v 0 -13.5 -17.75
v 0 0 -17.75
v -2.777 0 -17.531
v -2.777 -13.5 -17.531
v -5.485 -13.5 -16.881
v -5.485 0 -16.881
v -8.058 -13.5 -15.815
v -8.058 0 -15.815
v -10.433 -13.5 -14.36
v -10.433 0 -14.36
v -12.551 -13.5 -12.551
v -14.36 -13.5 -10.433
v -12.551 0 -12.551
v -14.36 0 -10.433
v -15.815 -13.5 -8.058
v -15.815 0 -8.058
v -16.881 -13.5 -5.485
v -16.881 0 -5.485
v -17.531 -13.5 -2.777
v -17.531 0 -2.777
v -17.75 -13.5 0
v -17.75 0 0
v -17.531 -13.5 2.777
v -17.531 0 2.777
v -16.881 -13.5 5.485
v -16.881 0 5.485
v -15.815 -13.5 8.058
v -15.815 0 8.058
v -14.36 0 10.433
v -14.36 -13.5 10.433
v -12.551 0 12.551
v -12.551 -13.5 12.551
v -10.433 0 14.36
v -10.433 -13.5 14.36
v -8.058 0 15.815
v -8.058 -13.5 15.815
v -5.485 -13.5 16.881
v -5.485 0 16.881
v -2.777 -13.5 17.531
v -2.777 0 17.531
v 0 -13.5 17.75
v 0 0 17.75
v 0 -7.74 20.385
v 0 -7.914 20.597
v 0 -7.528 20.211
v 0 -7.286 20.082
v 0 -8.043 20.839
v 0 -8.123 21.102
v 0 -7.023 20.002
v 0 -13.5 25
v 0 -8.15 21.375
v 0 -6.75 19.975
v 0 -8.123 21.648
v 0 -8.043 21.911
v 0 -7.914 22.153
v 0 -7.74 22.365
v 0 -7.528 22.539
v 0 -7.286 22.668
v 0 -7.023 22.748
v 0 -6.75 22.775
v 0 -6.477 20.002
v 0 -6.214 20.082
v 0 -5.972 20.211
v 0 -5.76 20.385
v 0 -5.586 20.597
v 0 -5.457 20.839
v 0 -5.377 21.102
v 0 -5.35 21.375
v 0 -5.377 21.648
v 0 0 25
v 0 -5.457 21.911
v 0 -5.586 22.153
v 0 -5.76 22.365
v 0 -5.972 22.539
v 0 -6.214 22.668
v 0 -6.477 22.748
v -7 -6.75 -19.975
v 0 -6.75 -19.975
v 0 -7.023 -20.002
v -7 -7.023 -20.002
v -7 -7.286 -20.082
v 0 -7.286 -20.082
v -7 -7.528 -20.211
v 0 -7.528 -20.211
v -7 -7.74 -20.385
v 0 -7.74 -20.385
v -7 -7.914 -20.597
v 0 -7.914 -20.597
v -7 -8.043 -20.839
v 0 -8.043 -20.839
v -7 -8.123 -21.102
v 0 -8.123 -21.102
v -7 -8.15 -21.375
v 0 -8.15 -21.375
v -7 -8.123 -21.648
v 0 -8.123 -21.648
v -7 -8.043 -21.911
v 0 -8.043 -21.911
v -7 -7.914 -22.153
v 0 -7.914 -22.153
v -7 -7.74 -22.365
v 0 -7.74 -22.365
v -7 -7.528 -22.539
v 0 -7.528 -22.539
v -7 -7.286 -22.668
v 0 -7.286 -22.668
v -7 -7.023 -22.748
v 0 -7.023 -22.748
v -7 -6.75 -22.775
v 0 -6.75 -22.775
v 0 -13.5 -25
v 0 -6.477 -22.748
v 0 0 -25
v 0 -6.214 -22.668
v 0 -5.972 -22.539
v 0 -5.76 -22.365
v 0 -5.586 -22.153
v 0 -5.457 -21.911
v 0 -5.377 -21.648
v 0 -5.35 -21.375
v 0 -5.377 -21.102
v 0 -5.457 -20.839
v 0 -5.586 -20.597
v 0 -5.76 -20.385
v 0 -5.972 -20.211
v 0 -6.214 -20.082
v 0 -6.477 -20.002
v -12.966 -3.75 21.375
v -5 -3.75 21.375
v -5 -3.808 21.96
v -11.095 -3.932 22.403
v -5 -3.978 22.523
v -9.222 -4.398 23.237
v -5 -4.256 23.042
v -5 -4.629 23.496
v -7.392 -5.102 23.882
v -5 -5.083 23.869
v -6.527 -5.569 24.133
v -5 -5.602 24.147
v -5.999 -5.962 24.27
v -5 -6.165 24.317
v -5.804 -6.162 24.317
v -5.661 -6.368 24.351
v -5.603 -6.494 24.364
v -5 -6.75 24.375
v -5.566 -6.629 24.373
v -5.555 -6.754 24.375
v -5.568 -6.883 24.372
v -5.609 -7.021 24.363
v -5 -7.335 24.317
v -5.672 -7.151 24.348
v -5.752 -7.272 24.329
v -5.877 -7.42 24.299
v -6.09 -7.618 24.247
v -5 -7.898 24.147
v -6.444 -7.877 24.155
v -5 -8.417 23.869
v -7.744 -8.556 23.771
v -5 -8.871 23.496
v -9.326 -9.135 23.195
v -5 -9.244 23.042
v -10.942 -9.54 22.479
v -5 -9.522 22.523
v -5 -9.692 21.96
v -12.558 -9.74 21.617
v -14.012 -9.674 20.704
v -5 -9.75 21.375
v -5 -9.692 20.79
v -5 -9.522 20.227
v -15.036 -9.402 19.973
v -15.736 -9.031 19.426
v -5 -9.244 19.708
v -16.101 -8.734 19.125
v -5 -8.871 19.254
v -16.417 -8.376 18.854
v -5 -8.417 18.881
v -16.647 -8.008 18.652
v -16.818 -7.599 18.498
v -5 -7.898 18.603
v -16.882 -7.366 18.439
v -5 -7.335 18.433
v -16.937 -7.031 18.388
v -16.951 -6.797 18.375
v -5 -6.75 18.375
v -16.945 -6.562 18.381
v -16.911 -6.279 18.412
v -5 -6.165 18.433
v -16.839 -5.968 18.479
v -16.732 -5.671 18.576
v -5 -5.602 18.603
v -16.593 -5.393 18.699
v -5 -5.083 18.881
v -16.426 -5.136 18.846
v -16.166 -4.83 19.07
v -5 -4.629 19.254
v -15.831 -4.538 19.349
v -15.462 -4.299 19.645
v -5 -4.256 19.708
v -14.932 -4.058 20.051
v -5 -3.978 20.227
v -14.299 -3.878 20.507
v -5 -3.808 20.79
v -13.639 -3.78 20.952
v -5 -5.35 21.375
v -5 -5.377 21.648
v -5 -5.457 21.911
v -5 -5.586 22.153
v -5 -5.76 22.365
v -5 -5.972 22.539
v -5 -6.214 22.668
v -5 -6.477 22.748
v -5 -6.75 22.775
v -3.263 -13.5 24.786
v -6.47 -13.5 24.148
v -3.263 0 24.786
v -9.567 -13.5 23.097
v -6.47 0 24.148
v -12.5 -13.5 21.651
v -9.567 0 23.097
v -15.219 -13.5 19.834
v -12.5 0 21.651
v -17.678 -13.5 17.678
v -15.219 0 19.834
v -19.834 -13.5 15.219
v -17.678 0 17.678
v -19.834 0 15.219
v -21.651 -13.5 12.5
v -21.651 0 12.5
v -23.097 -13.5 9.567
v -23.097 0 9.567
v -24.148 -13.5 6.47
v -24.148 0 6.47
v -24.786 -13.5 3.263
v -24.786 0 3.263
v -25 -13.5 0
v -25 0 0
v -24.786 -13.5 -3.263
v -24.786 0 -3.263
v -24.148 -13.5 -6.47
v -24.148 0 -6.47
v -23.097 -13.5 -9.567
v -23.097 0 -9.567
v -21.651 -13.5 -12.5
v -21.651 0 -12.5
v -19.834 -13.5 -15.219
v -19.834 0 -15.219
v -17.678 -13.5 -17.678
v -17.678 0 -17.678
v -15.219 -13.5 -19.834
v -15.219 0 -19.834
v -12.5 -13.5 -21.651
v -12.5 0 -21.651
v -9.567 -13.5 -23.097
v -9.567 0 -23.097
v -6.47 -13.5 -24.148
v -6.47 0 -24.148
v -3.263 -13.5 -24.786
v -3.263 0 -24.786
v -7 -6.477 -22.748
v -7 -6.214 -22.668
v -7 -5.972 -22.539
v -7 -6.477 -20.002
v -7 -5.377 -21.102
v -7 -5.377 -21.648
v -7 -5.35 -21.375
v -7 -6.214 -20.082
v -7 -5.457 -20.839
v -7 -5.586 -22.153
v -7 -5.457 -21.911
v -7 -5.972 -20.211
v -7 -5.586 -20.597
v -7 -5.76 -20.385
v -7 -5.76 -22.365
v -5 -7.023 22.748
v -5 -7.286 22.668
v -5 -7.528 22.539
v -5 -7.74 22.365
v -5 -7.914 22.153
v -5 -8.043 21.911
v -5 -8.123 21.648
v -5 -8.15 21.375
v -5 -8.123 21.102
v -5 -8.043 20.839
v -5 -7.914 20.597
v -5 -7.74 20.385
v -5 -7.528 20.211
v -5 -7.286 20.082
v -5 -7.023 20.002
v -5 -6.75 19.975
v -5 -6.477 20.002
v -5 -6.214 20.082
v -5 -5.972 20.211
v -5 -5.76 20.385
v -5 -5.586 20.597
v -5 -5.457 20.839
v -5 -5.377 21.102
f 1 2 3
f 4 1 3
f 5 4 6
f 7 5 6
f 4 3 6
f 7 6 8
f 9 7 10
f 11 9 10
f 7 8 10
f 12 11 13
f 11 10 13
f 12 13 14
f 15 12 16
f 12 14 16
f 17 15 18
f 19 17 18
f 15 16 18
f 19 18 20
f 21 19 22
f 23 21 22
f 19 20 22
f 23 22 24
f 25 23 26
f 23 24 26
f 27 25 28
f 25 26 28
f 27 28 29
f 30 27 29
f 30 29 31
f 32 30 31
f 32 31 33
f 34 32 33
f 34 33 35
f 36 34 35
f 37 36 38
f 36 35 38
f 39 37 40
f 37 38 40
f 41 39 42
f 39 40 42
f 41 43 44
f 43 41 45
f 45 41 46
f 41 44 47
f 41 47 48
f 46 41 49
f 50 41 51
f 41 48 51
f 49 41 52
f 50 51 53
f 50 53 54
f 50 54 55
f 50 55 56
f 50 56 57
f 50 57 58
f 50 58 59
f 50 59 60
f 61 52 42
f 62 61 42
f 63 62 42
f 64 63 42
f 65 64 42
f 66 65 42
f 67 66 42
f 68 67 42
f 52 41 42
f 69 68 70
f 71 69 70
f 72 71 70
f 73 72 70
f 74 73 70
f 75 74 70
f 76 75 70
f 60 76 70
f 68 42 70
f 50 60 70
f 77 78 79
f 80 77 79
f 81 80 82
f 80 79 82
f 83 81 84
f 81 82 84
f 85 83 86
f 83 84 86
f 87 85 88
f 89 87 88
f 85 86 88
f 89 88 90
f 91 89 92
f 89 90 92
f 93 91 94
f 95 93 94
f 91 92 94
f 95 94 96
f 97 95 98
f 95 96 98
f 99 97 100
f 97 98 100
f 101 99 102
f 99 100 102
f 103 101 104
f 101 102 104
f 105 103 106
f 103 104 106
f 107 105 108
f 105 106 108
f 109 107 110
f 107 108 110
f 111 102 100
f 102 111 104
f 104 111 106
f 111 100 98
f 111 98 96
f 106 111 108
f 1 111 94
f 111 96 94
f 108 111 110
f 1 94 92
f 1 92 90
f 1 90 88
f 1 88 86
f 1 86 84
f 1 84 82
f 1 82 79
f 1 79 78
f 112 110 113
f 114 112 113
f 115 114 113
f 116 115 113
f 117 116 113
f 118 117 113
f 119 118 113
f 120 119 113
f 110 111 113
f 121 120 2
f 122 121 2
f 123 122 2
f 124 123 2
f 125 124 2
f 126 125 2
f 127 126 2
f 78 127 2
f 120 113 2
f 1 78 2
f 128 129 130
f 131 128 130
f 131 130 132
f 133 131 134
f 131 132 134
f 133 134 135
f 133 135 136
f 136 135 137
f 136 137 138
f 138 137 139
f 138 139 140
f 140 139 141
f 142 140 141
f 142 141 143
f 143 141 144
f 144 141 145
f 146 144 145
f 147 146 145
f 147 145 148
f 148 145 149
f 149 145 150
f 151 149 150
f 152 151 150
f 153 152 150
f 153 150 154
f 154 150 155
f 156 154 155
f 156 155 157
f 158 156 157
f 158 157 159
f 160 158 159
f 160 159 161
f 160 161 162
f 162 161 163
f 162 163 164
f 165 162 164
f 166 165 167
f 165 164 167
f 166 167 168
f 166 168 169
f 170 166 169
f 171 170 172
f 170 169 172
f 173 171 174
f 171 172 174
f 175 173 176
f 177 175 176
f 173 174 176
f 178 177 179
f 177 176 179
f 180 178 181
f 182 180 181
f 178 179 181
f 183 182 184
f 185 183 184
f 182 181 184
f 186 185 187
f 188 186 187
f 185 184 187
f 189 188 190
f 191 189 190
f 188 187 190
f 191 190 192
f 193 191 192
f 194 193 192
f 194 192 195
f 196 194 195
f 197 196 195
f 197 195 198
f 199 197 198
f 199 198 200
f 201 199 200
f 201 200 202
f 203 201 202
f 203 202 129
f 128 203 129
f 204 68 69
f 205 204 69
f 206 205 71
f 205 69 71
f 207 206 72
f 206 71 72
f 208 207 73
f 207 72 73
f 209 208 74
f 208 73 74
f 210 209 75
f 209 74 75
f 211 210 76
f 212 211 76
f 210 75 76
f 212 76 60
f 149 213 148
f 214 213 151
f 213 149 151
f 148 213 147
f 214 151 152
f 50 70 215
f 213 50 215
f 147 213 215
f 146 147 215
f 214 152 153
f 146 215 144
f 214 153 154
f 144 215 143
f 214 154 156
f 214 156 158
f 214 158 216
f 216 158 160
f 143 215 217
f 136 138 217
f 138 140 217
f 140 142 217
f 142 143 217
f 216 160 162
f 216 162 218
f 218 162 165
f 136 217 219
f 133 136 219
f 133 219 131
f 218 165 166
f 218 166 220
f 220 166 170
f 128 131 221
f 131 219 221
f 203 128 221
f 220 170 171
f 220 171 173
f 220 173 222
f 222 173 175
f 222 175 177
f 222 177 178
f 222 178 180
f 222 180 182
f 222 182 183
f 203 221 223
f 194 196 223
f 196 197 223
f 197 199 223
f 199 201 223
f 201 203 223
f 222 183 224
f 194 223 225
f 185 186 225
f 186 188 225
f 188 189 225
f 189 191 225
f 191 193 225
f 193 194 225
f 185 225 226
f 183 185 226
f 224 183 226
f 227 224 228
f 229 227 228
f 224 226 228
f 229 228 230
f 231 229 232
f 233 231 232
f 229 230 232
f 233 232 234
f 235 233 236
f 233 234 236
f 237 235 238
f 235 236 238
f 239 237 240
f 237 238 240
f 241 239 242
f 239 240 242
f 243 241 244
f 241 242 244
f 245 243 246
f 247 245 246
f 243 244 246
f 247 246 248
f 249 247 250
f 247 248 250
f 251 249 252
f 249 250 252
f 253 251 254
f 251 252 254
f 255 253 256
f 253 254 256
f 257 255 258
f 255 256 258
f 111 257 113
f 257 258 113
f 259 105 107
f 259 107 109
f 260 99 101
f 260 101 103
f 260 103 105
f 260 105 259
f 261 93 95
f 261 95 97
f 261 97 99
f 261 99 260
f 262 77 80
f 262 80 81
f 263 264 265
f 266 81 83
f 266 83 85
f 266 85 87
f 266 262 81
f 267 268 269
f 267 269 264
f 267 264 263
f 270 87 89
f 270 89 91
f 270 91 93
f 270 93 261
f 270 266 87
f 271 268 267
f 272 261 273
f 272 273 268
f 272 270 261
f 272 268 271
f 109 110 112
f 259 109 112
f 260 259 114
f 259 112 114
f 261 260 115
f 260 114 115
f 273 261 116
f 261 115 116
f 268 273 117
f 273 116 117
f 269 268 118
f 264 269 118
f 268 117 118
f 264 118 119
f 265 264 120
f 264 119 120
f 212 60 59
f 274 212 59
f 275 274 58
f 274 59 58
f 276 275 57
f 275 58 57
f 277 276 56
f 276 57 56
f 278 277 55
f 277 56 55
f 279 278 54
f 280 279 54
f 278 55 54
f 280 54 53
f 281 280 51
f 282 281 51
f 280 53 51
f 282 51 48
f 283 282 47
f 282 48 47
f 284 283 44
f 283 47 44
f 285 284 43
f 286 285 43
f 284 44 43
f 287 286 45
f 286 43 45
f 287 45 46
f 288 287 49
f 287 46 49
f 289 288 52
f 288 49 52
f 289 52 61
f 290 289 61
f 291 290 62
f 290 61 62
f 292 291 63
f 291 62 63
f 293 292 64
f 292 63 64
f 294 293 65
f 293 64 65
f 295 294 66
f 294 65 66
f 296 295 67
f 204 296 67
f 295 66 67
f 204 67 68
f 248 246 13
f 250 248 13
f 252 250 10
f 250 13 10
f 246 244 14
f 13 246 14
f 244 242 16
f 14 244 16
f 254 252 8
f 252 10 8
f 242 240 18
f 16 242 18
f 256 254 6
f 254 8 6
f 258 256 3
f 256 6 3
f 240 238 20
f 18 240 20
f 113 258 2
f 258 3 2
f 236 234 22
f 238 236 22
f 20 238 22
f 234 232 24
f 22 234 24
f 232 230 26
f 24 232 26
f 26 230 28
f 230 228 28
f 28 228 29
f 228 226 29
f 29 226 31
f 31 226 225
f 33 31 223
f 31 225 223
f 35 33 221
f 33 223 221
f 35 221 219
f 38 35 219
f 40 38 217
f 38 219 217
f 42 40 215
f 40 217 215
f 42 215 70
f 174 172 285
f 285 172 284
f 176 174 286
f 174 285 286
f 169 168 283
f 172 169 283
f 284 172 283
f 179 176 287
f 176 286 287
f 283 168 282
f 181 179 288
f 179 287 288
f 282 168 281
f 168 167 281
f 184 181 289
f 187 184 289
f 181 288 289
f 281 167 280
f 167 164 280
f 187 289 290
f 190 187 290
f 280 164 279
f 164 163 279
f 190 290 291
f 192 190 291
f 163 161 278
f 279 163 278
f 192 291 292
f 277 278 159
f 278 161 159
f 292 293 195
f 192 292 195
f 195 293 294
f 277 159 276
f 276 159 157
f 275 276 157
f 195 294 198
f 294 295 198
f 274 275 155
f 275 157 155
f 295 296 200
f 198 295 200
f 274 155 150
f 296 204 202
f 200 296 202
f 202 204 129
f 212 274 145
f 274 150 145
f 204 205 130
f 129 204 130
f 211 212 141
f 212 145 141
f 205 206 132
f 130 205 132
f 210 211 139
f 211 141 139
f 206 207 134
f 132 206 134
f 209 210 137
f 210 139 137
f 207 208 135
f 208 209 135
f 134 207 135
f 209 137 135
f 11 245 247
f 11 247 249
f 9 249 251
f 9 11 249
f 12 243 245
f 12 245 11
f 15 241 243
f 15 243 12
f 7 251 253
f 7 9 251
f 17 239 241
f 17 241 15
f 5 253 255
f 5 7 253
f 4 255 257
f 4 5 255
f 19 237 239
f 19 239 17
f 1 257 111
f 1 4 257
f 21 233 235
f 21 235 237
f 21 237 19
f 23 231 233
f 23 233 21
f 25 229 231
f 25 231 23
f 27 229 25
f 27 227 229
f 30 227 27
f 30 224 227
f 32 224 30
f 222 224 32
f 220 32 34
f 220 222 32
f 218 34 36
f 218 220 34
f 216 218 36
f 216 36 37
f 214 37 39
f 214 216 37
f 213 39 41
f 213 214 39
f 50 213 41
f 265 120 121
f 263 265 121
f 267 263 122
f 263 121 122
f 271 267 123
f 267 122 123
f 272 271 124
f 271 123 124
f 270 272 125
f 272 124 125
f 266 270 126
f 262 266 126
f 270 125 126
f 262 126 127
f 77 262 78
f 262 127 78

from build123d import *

# Parameters (mm, degrees)
F1_DEPTH = 13.5
F3_DEPTH = 5
F4_R     = 3
F5_DEPTH = 25
F7_DEPTH = 7


with BuildPart() as f1:
    # F0 (on Front) → F1 (new body)
    with BuildSketch(Plane.XZ):
        with BuildLine():
            ThreePointArc((0, -17.75), (-17.75, 0), (0, 17.75))
            Line((0, 17.75), (0, 25))
            ThreePointArc((0, 25), (-25, 0), (0, -25))
            Line((0, -25), (0, -17.75))
        make_face()
    extrude(amount=F1_DEPTH)

    # F2 (on face) → F3 (cut)
    with BuildSketch(Plane.YZ):
        with BuildLine():
            ThreePointArc((-5.35, 21.375), (-5.760051, 22.364949), (-6.75, 22.775))
            Line((-6.75, 22.775), (-6.75, 19.975))
            ThreePointArc((-6.75, 19.975), (-5.760051, 20.385051), (-5.35, 21.375))
        make_face()
        with BuildLine():
            Line((-6.75, 19.975), (-6.75, 22.775))
            ThreePointArc((-6.75, 22.775), (-8.15, 21.375), (-6.75, 19.975))
        make_face()
    extrude(amount=-F3_DEPTH, mode=Mode.SUBTRACT)

    # F4 (on face) → F5 (cut)
    with BuildSketch(Plane.YZ.offset(-5)):
        with Locations((-6.75, 21.375)):
            Circle(F4_R)
    extrude(amount=-F5_DEPTH, mode=Mode.SUBTRACT)

    # F6 (on face) → F7 (cut)
    with BuildSketch(Plane.YZ):
        with BuildLine():
            ThreePointArc((-5.35, -21.375), (-5.760051, -20.385051), (-6.75, -19.975))
            Line((-6.75, -19.975), (-6.75, -22.775))
            ThreePointArc((-6.75, -22.775), (-5.760051, -22.364949), (-5.35, -21.375))
        make_face()
        with BuildLine():
            Line((-6.75, -22.775), (-6.75, -19.975))
            ThreePointArc((-6.75, -19.975), (-8.15, -21.375), (-6.75, -22.775))
        make_face()
    extrude(amount=-F7_DEPTH, mode=Mode.SUBTRACT)


solid = f1.part
